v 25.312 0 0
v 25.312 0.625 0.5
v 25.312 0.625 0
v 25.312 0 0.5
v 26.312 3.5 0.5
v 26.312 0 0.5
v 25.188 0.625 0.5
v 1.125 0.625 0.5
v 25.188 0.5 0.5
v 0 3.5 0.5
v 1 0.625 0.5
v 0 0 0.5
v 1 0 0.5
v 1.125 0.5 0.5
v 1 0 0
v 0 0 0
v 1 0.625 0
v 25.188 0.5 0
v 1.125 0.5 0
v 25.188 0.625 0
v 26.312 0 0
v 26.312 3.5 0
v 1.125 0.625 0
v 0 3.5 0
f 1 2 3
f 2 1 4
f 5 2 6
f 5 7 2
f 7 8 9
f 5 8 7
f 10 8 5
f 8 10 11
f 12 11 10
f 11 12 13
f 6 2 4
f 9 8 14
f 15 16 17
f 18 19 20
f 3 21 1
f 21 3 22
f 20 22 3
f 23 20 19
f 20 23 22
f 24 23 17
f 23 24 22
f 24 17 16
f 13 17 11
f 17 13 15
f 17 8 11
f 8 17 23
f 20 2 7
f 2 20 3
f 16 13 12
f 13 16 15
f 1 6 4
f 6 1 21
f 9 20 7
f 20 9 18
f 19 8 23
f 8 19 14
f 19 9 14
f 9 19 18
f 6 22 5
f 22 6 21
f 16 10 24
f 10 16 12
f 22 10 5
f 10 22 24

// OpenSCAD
// file: modus.scad
//Corner Joint - allows the sides of two parts to create inlayed corner. Aids with welding.
//need to verify module math is the same throughout all parts.

module cornerjoint(Z,L,H,EndGap,PadL,PadH,CJangle,CJcenter){
    //change so that H = Z of inlayed part (usually 0.5)
    //add center and angle in degrees option, orgin far side of cut out area

     if((CJangle==0)&&(CJcenter==0))
      {    
        translate([0,0,0])
        rotate([0,0,CJangle])
        difference(){
        cube([L,H+PadH,Z]);
        translate([EndGap,H,0])
        cube([PadL,PadH,Z]);
        translate([L-EndGap-PadL,H,0])
        cube([PadL,PadH,Z]);}
      }    
else if((CJangle==90)&&(CJcenter==0))
      {    
        translate([H+PadH,0,0])
        rotate([0,0,CJangle])
        difference(){
        cube([L,H+PadH,Z]);
        translate([EndGap,H,0])
        cube([PadL,PadH,Z]);
        translate([L-EndGap-PadL,H,0])
        cube([PadL,PadH,Z]);}
      }
else if((CJangle==180)&&(CJcenter==0))       
      {    
        translate([L,H+PadH,0])
        rotate([0,0,CJangle])
        difference(){
        cube([L,H+PadH,Z]);
        translate([EndGap,H,0])
        cube([PadL,PadH,Z]);
        translate([L-EndGap-PadL,H,0])
        cube([PadL,PadH,Z]);}
      }
else if((CJangle==270)&&(CJcenter==0))
      {    
        translate([0,L,0])
        rotate([0,0,CJangle])
        difference(){
        cube([L,H+PadH,Z]);
        translate([EndGap,H,0])
        cube([PadL,PadH,Z]);
        translate([L-EndGap-PadL,H,0])
        cube([PadL,PadH,Z]);}
      }  
      
//centered     
   
else if((CJangle==0)&&(CJcenter==1))
      {    
        translate([-L/2,0,0])
        rotate([0,0,CJangle])
        difference(){
        cube([L,H+PadH,Z]);
        translate([EndGap,H,0])
        cube([PadL,PadH,Z]);
        translate([L-EndGap-PadL,H,0])
        cube([PadL,PadH,Z]);}
      }  
else if((CJangle==90)&&(CJcenter==1))
      {    
        translate([0,-L/2,0])
        rotate([0,0,CJangle])
        difference(){
        cube([L,H+PadH,Z]);
        translate([EndGap,H,0])
        cube([PadL,PadH,Z]);
        translate([L-EndGap-PadL,H,0])
        cube([PadL,PadH,Z]);}
      }
else if((CJangle==180)&&(CJcenter==1))       
      {    
        translate([L/2,0,0])
        rotate([0,0,CJangle])
        difference(){
        cube([L,H+PadH,Z]);
        translate([EndGap,H,0])
        cube([PadL,PadH,Z]);
        translate([L-EndGap-PadL,H,0])
        cube([PadL,PadH,Z]);}
      }
else if((CJangle==270)&&(CJcenter==1))
      {    
        translate([0,L/2,0])
        rotate([0,0,CJangle])
        difference(){
        cube([L,H+PadH,Z]);
        translate([EndGap,H,0])
        cube([PadL,PadH,Z]);
        translate([L-EndGap-PadL,H,0])
        cube([PadL,PadH,Z]);}
      }
} //end cornerjoint module

//Tab Insert - used to cut a hole for an abutting part to insert into. Typically aids with welding the two parts.
module tabinsert(X,Y,Z,dGap,cGap,c1,c2,c3,c4,c5,c6,c7,c8,center){
    translate([-dGap-(center*(X/2)),-dGap-(center*(Y/2)),0]){
        //main cut
        cube([X+(dGap*2),Y+(dGap*2),Z]);
        //corner c1c2
        translate([-cGap,(Y+(dGap*2))-c1+cGap,0])
            {
        cube([c2,c1,Z]);}
       //corner c3c4
       translate([(X+(dGap*2))-c3+cGap,(Y+(dGap*2))-c4+cGap,0]){
           cube([c3,c4,Z]);
       }
       //corner c5c6
       translate([(X+(dGap*2))-c6+cGap,-cGap,0])
      {
          cube([c6,c5,Z]);
      }
       
       //corner c7c8 
       translate([-cGap,-cGap,0]){
           cube([c7,c8,Z]);
       }
    
    } //end center translate
} //end tabinsert module
 

module nut(flattoflat,nutheight){  //distance from one flat side to the other flat side "A/F"

//typical sizes found here:
//https://en.wikipedia.org/wiki/Nut_(hardware)

difference(){
    translate([0,0,nutheight/2])
cube(size = [10,10,nutheight], center = true);
    
for(i=[1:6]){
    rotate([0,0,i*60])
difference(){
    translate([-10,0,0])
    cube([20,20,nutheight]);
    translate([-10,0,0])
    cube([20,flattoflat/2,nutheight]);
}  //end difference
}  //end for
}  //end differeence
}  //end module
// file: vars.scad
brickW=6; 
brickL=24;
brickCH=6; //Is brick height being shortened by d1z??

//3.625 x 2.25 x 8
//6 x 12 x 6

grateX=56;
grateY=23;
grateH=37; //Height mounted above press's frame
grateA=17.5; //angle of grate

//grateX=56;
//grateY=23;
//grateH=37; //Height mounted above press's frame
//grateA=17.5; //angle of grate


$fn=8; //defines resolution of circles. 8 is okay for review. 100  or greater should be used for for final dxf export.

dZstandard=0.5; //thickness of steel to be cut for drawer parts
fZstandard=0.5;
aZstandard=0.5; //thickness of steel to be cut for arm parts
hZstandard=0.125;

fBOLTHOLEstandardD=1; //standard bolts used on frame
aBOLTHOLEstandardD=1;

sliderodholeOD=1.2; 
d1bushingOD=1.25;
d1bushingL=1.25;
d1shaftOD=1;
d1bolt1OD=1;
d1bolt2OD=0.75;
d1nut2AF=1.25;
d1nut2H=0.665;


dGap=0.03125; //gap between a hole cut's edge and the part sitting within the hole. //D3 appears to use 0.3125, is this in error?

//all parts set to standard thickness below
//off standard preferences can be defined below

//drawer
drawergap=0.0283;  //extra room for drawer to slide in the space between f1 and f4
drawerHgap=0.1884;  //total extra space from drawer sides to frame walls. sum of both sides.

d2clevispinaccessholeOD=3;

d1z=dZstandard;
d2z=dZstandard;
d3z=dZstandard;
d4z=dZstandard;
d5z=dZstandard;
d6z=dZstandard;
d5z=dZstandard;
d7z=dZstandard;
d8z=dZstandard;
d9z=dZstandard;

d11z=dZstandard;
d12z=dZstandard;


//frame

f1y=6;
f1z=fZstandard;


f2y=3.5;
f2z=fZstandard;

f3y=3.5;
f3z=fZstandard;

f4y=11;
f4z=fZstandard;

f5y=3.5;
f5z=fZstandard;

f6y=8;
f6z=fZstandard;

f8y=brickW;
f8z=fZstandard;
f8boltD=1;

f9y=4.5;

f9z=fZstandard;




f12z=fZstandard;   

f11x=1.25;
f11z=fZstandard;

f13z=fZstandard;

f14y=3.5;
f14z=fZstandard;

//arms

a1x=4;
a1z=aZstandard;
a1out=24; //length from frame to A5 edge for bricks to sit on as they exit

a2x=6;
a2z=aZstandard;

a3x=4;
a3y=72;
a3z=aZstandard;

a4x=6;
a4y=72;
a4z=aZstandard;

a5x=6;
a5y=72;
a5z=aZstandard;

a6z=aZstandard;

//guards

h1x=grateX;
h1y=grateH;  //might need to tweak for grate thickness

h1z=hZstandard;
h2z=hZstandard;
h3z=hZstandard;
h4z=hZstandard;
h5z=hZstandard;
h6z=hZstandard;
h7z=hZstandard;
h8z=hZstandard;

//
//Input your main cylinder's dimenions here
//
cylMainBore = 5;
cylMainStroke = 16;
cylMainExt = 43;
cylMainRet = 27;
cylMainA = (cylMainRet-cylMainStroke); //center to center minus stroke length
cylMainB = 0.25; // cylinder wall thickness
cylMainD = 2.5; //Rod OD
cylMainE = 5.75; //rear pin holder width
cylMainG = 4; //rod pin holder width
cylMainJ = 3.8; //distance from the end of the cylinder body to rod pin center
cylMainR = 1.52; //pin hole ID
cylMainS = 2.5; //pin holder OD

//
//Input your drawer cylinder's dimenions here
//
//
cylDrawerBore = 5;
cylDrawerStroke = 16;
cylDrawerExt = 43;
cylDrawerRet = 27;
cylDrawerA = (cylMainRet-cylMainStroke); //center to center minus stroke length
cylDrawerB = 0.25; // cylinder wall thickness
cylDrawerD = 2.5; //Rod OD
cylDrawerE = 5.75; //rear pin holder width
cylDrawerG = 4; //rod pin holder width
cylDrawerJ = 3.8; //distance from the end of the cylinder body to rod pin center
cylDrawerR = 1.52; //pin hole ID
cylDrawerS = 2.5; //pin holder OD

cylinderDRAWERbodyH=3; //measured when in position, largest length from top to bottom of cylinder
cylinderDRAWERminC2C=0; //drawer's hydraulic cylinder's distance from the center of one mounting hole to the center of the other when fully compressed.
cylinderDRAWERmaxC2C=0; ///drawer's hydraulic cylinder's distance from the center of one mounting hole to the center of the other when fully extended.
cylinderDRAWERrodclevisW=2.5; //width of cylinders' clevis on end of rod
cylinderDRAWERrodclevisID=1;
cylinderDRAWERrodclevisOD=2;
cylinderDRAWERrearclevisW=2.5; //width of mounting clevis cylinder body
cylinderDRAWERrearclevisID=1;
cylinderDRAWERrearclevisOD=2;
cylinderDRAWERrearclevisClearance=3; //usable space around rear clevis pin (in diameter). be aware of hyraulic fittings.

//the following variables are calculated in order of dependence on preceding variables

d3x=brickL+(d2z*2);
d3y=brickCH-d1z;
d4x=brickW+d3z+d3z;
d4y=brickCH-d1z;
d5x=brickL+(d2z*2);
d5y=brickW;
d6x=brickL+(d2z*2);
d6y=brickCH;
d7x=cylinderDRAWERrearclevisClearance;
d7y=a4z+d8z+cylinderDRAWERbodyH;
d9x=cylinderDRAWERbodyH+d6z; //should be based on clevis size?
d9y=cylinderDRAWERbodyH+d8z;
d8x=brickL+(d2z*2);
d8y=max(5,(d9x-d6z));   //need to review fundamentals, 5 minimun unless d9 gets larger than d8
d11x=1.5+(d1bolt1OD*2)+d1bushingOD;
d11y=max((0.5+d1bushingL),4);

d12x=d8x;
d12y=d11y+1;

f1x=((brickL+(d2z*2)+drawerHgap+(f9y*2)));
f3x=f1x;

d1x=(brickL+d2z+d2z);
//d1x=(((f1x/2)-(((brickL+(d2z*2)+drawerHgap)/2)-fZstandard-(sliderodholeOD/2)))+(d11x/2))*2;
d1y=((brickW+d3z+d3z)*3)+1;

d2x=d8y+d6z+brickW+d3z+d5y+d3z;
d2y=brickCH;



f11y=f8y;
f6x=brickL+(d2z*2)+(f9y*2)+drawerHgap;

f9x=(f2z+((cylMainS+0.125)/2)+cylMainRet-cylMainJ+1+f4y+drawergap+d2y+f1y);  //leaves 1" between top of cylinder and bottom of F4
f8x=f9x;


f2x=brickL+(d2z*2)+drawerHgap+(f9y*2)-(1.4*2);  //distance between large cut outs in f9

f5x=brickL+(d2z*2)+drawerHgap+(f9y*2)+(a1x*2); //distance between outer edges of each A1

f4x=f5x-0.5;   //same as f5 but minus 0.25 on each side to give a little overhang

f14x=brickL+(1*2)+(.125*2)+(dGap*2); 

f12x=f3x;
f12y=(f3y*2)+brickW;

sliderodoffset=(((brickL+(d2z*2)+drawerHgap)/2)-fZstandard-(sliderodholeOD/2));

distancetof8center=(cylDrawerExt+(a4x/2)+((d9x-d6z)/2)+d6z+(brickW/2)); //F8 center on A1

a1y=distancetof8center+(brickW/2)+a1out;
a2y=a1y;

h7x=f5x-((a1x/2)*2)+(1.5*2);
h7y=cylDrawerStroke;

h8x=f5x-((a1x/2)*2)+(1.5*2);
h8y=a1out-a5x-f5y;  //distance between a5 and f5

hopperBaseX=brickL;
hopperBaseY=brickW;

h2x=grateX;
h2y=sqrt(((h1y-(sin(grateA)*grateY))*(h1y-(sin(grateA)*grateY)))+(((cos(grateA)*grateY)-hopperBaseY)*((cos(grateA)*grateY)-hopperBaseY)));

//h1y-(sin(grateA)*grateY)
//(cos(grateA)*grateY)-hopperBaseY

echo(h1y-(sin(grateA)*grateY));
echo((cos(grateA)*grateY)-hopperBaseY);
echo(h2y);
echo(atan((h1y-(sin(grateA)*grateY))/((cos(grateA)*grateY)-hopperBaseY)));
echo((h1y-(sin(grateA)*grateY))/(h1y));

// ECHO - REQUIRED PARTS BASED ON INPUTS

echo(str("Minimum drawer cylinder stroke length: ",(d3z*2)+d5y+brickW));
//would be cool to validate and confirm user inputed stroke length. set error=1; if drawer cylinder is not long enough. print an echo warning.

echo(str("Grate hieght above ground level: ",(1)));
// main file
include <vars.scad>;
use <modus.scad>;

f14p();

module f14p(){
    
difference(){
    cube([f14x,f14y,f14z]);
    translate([1,0,0])
        cornerjoint(f14z,f14x-2,f4z,0.125,f14x-2-0.25,0.125,0,0);
} //end difference

} //end f14p module
